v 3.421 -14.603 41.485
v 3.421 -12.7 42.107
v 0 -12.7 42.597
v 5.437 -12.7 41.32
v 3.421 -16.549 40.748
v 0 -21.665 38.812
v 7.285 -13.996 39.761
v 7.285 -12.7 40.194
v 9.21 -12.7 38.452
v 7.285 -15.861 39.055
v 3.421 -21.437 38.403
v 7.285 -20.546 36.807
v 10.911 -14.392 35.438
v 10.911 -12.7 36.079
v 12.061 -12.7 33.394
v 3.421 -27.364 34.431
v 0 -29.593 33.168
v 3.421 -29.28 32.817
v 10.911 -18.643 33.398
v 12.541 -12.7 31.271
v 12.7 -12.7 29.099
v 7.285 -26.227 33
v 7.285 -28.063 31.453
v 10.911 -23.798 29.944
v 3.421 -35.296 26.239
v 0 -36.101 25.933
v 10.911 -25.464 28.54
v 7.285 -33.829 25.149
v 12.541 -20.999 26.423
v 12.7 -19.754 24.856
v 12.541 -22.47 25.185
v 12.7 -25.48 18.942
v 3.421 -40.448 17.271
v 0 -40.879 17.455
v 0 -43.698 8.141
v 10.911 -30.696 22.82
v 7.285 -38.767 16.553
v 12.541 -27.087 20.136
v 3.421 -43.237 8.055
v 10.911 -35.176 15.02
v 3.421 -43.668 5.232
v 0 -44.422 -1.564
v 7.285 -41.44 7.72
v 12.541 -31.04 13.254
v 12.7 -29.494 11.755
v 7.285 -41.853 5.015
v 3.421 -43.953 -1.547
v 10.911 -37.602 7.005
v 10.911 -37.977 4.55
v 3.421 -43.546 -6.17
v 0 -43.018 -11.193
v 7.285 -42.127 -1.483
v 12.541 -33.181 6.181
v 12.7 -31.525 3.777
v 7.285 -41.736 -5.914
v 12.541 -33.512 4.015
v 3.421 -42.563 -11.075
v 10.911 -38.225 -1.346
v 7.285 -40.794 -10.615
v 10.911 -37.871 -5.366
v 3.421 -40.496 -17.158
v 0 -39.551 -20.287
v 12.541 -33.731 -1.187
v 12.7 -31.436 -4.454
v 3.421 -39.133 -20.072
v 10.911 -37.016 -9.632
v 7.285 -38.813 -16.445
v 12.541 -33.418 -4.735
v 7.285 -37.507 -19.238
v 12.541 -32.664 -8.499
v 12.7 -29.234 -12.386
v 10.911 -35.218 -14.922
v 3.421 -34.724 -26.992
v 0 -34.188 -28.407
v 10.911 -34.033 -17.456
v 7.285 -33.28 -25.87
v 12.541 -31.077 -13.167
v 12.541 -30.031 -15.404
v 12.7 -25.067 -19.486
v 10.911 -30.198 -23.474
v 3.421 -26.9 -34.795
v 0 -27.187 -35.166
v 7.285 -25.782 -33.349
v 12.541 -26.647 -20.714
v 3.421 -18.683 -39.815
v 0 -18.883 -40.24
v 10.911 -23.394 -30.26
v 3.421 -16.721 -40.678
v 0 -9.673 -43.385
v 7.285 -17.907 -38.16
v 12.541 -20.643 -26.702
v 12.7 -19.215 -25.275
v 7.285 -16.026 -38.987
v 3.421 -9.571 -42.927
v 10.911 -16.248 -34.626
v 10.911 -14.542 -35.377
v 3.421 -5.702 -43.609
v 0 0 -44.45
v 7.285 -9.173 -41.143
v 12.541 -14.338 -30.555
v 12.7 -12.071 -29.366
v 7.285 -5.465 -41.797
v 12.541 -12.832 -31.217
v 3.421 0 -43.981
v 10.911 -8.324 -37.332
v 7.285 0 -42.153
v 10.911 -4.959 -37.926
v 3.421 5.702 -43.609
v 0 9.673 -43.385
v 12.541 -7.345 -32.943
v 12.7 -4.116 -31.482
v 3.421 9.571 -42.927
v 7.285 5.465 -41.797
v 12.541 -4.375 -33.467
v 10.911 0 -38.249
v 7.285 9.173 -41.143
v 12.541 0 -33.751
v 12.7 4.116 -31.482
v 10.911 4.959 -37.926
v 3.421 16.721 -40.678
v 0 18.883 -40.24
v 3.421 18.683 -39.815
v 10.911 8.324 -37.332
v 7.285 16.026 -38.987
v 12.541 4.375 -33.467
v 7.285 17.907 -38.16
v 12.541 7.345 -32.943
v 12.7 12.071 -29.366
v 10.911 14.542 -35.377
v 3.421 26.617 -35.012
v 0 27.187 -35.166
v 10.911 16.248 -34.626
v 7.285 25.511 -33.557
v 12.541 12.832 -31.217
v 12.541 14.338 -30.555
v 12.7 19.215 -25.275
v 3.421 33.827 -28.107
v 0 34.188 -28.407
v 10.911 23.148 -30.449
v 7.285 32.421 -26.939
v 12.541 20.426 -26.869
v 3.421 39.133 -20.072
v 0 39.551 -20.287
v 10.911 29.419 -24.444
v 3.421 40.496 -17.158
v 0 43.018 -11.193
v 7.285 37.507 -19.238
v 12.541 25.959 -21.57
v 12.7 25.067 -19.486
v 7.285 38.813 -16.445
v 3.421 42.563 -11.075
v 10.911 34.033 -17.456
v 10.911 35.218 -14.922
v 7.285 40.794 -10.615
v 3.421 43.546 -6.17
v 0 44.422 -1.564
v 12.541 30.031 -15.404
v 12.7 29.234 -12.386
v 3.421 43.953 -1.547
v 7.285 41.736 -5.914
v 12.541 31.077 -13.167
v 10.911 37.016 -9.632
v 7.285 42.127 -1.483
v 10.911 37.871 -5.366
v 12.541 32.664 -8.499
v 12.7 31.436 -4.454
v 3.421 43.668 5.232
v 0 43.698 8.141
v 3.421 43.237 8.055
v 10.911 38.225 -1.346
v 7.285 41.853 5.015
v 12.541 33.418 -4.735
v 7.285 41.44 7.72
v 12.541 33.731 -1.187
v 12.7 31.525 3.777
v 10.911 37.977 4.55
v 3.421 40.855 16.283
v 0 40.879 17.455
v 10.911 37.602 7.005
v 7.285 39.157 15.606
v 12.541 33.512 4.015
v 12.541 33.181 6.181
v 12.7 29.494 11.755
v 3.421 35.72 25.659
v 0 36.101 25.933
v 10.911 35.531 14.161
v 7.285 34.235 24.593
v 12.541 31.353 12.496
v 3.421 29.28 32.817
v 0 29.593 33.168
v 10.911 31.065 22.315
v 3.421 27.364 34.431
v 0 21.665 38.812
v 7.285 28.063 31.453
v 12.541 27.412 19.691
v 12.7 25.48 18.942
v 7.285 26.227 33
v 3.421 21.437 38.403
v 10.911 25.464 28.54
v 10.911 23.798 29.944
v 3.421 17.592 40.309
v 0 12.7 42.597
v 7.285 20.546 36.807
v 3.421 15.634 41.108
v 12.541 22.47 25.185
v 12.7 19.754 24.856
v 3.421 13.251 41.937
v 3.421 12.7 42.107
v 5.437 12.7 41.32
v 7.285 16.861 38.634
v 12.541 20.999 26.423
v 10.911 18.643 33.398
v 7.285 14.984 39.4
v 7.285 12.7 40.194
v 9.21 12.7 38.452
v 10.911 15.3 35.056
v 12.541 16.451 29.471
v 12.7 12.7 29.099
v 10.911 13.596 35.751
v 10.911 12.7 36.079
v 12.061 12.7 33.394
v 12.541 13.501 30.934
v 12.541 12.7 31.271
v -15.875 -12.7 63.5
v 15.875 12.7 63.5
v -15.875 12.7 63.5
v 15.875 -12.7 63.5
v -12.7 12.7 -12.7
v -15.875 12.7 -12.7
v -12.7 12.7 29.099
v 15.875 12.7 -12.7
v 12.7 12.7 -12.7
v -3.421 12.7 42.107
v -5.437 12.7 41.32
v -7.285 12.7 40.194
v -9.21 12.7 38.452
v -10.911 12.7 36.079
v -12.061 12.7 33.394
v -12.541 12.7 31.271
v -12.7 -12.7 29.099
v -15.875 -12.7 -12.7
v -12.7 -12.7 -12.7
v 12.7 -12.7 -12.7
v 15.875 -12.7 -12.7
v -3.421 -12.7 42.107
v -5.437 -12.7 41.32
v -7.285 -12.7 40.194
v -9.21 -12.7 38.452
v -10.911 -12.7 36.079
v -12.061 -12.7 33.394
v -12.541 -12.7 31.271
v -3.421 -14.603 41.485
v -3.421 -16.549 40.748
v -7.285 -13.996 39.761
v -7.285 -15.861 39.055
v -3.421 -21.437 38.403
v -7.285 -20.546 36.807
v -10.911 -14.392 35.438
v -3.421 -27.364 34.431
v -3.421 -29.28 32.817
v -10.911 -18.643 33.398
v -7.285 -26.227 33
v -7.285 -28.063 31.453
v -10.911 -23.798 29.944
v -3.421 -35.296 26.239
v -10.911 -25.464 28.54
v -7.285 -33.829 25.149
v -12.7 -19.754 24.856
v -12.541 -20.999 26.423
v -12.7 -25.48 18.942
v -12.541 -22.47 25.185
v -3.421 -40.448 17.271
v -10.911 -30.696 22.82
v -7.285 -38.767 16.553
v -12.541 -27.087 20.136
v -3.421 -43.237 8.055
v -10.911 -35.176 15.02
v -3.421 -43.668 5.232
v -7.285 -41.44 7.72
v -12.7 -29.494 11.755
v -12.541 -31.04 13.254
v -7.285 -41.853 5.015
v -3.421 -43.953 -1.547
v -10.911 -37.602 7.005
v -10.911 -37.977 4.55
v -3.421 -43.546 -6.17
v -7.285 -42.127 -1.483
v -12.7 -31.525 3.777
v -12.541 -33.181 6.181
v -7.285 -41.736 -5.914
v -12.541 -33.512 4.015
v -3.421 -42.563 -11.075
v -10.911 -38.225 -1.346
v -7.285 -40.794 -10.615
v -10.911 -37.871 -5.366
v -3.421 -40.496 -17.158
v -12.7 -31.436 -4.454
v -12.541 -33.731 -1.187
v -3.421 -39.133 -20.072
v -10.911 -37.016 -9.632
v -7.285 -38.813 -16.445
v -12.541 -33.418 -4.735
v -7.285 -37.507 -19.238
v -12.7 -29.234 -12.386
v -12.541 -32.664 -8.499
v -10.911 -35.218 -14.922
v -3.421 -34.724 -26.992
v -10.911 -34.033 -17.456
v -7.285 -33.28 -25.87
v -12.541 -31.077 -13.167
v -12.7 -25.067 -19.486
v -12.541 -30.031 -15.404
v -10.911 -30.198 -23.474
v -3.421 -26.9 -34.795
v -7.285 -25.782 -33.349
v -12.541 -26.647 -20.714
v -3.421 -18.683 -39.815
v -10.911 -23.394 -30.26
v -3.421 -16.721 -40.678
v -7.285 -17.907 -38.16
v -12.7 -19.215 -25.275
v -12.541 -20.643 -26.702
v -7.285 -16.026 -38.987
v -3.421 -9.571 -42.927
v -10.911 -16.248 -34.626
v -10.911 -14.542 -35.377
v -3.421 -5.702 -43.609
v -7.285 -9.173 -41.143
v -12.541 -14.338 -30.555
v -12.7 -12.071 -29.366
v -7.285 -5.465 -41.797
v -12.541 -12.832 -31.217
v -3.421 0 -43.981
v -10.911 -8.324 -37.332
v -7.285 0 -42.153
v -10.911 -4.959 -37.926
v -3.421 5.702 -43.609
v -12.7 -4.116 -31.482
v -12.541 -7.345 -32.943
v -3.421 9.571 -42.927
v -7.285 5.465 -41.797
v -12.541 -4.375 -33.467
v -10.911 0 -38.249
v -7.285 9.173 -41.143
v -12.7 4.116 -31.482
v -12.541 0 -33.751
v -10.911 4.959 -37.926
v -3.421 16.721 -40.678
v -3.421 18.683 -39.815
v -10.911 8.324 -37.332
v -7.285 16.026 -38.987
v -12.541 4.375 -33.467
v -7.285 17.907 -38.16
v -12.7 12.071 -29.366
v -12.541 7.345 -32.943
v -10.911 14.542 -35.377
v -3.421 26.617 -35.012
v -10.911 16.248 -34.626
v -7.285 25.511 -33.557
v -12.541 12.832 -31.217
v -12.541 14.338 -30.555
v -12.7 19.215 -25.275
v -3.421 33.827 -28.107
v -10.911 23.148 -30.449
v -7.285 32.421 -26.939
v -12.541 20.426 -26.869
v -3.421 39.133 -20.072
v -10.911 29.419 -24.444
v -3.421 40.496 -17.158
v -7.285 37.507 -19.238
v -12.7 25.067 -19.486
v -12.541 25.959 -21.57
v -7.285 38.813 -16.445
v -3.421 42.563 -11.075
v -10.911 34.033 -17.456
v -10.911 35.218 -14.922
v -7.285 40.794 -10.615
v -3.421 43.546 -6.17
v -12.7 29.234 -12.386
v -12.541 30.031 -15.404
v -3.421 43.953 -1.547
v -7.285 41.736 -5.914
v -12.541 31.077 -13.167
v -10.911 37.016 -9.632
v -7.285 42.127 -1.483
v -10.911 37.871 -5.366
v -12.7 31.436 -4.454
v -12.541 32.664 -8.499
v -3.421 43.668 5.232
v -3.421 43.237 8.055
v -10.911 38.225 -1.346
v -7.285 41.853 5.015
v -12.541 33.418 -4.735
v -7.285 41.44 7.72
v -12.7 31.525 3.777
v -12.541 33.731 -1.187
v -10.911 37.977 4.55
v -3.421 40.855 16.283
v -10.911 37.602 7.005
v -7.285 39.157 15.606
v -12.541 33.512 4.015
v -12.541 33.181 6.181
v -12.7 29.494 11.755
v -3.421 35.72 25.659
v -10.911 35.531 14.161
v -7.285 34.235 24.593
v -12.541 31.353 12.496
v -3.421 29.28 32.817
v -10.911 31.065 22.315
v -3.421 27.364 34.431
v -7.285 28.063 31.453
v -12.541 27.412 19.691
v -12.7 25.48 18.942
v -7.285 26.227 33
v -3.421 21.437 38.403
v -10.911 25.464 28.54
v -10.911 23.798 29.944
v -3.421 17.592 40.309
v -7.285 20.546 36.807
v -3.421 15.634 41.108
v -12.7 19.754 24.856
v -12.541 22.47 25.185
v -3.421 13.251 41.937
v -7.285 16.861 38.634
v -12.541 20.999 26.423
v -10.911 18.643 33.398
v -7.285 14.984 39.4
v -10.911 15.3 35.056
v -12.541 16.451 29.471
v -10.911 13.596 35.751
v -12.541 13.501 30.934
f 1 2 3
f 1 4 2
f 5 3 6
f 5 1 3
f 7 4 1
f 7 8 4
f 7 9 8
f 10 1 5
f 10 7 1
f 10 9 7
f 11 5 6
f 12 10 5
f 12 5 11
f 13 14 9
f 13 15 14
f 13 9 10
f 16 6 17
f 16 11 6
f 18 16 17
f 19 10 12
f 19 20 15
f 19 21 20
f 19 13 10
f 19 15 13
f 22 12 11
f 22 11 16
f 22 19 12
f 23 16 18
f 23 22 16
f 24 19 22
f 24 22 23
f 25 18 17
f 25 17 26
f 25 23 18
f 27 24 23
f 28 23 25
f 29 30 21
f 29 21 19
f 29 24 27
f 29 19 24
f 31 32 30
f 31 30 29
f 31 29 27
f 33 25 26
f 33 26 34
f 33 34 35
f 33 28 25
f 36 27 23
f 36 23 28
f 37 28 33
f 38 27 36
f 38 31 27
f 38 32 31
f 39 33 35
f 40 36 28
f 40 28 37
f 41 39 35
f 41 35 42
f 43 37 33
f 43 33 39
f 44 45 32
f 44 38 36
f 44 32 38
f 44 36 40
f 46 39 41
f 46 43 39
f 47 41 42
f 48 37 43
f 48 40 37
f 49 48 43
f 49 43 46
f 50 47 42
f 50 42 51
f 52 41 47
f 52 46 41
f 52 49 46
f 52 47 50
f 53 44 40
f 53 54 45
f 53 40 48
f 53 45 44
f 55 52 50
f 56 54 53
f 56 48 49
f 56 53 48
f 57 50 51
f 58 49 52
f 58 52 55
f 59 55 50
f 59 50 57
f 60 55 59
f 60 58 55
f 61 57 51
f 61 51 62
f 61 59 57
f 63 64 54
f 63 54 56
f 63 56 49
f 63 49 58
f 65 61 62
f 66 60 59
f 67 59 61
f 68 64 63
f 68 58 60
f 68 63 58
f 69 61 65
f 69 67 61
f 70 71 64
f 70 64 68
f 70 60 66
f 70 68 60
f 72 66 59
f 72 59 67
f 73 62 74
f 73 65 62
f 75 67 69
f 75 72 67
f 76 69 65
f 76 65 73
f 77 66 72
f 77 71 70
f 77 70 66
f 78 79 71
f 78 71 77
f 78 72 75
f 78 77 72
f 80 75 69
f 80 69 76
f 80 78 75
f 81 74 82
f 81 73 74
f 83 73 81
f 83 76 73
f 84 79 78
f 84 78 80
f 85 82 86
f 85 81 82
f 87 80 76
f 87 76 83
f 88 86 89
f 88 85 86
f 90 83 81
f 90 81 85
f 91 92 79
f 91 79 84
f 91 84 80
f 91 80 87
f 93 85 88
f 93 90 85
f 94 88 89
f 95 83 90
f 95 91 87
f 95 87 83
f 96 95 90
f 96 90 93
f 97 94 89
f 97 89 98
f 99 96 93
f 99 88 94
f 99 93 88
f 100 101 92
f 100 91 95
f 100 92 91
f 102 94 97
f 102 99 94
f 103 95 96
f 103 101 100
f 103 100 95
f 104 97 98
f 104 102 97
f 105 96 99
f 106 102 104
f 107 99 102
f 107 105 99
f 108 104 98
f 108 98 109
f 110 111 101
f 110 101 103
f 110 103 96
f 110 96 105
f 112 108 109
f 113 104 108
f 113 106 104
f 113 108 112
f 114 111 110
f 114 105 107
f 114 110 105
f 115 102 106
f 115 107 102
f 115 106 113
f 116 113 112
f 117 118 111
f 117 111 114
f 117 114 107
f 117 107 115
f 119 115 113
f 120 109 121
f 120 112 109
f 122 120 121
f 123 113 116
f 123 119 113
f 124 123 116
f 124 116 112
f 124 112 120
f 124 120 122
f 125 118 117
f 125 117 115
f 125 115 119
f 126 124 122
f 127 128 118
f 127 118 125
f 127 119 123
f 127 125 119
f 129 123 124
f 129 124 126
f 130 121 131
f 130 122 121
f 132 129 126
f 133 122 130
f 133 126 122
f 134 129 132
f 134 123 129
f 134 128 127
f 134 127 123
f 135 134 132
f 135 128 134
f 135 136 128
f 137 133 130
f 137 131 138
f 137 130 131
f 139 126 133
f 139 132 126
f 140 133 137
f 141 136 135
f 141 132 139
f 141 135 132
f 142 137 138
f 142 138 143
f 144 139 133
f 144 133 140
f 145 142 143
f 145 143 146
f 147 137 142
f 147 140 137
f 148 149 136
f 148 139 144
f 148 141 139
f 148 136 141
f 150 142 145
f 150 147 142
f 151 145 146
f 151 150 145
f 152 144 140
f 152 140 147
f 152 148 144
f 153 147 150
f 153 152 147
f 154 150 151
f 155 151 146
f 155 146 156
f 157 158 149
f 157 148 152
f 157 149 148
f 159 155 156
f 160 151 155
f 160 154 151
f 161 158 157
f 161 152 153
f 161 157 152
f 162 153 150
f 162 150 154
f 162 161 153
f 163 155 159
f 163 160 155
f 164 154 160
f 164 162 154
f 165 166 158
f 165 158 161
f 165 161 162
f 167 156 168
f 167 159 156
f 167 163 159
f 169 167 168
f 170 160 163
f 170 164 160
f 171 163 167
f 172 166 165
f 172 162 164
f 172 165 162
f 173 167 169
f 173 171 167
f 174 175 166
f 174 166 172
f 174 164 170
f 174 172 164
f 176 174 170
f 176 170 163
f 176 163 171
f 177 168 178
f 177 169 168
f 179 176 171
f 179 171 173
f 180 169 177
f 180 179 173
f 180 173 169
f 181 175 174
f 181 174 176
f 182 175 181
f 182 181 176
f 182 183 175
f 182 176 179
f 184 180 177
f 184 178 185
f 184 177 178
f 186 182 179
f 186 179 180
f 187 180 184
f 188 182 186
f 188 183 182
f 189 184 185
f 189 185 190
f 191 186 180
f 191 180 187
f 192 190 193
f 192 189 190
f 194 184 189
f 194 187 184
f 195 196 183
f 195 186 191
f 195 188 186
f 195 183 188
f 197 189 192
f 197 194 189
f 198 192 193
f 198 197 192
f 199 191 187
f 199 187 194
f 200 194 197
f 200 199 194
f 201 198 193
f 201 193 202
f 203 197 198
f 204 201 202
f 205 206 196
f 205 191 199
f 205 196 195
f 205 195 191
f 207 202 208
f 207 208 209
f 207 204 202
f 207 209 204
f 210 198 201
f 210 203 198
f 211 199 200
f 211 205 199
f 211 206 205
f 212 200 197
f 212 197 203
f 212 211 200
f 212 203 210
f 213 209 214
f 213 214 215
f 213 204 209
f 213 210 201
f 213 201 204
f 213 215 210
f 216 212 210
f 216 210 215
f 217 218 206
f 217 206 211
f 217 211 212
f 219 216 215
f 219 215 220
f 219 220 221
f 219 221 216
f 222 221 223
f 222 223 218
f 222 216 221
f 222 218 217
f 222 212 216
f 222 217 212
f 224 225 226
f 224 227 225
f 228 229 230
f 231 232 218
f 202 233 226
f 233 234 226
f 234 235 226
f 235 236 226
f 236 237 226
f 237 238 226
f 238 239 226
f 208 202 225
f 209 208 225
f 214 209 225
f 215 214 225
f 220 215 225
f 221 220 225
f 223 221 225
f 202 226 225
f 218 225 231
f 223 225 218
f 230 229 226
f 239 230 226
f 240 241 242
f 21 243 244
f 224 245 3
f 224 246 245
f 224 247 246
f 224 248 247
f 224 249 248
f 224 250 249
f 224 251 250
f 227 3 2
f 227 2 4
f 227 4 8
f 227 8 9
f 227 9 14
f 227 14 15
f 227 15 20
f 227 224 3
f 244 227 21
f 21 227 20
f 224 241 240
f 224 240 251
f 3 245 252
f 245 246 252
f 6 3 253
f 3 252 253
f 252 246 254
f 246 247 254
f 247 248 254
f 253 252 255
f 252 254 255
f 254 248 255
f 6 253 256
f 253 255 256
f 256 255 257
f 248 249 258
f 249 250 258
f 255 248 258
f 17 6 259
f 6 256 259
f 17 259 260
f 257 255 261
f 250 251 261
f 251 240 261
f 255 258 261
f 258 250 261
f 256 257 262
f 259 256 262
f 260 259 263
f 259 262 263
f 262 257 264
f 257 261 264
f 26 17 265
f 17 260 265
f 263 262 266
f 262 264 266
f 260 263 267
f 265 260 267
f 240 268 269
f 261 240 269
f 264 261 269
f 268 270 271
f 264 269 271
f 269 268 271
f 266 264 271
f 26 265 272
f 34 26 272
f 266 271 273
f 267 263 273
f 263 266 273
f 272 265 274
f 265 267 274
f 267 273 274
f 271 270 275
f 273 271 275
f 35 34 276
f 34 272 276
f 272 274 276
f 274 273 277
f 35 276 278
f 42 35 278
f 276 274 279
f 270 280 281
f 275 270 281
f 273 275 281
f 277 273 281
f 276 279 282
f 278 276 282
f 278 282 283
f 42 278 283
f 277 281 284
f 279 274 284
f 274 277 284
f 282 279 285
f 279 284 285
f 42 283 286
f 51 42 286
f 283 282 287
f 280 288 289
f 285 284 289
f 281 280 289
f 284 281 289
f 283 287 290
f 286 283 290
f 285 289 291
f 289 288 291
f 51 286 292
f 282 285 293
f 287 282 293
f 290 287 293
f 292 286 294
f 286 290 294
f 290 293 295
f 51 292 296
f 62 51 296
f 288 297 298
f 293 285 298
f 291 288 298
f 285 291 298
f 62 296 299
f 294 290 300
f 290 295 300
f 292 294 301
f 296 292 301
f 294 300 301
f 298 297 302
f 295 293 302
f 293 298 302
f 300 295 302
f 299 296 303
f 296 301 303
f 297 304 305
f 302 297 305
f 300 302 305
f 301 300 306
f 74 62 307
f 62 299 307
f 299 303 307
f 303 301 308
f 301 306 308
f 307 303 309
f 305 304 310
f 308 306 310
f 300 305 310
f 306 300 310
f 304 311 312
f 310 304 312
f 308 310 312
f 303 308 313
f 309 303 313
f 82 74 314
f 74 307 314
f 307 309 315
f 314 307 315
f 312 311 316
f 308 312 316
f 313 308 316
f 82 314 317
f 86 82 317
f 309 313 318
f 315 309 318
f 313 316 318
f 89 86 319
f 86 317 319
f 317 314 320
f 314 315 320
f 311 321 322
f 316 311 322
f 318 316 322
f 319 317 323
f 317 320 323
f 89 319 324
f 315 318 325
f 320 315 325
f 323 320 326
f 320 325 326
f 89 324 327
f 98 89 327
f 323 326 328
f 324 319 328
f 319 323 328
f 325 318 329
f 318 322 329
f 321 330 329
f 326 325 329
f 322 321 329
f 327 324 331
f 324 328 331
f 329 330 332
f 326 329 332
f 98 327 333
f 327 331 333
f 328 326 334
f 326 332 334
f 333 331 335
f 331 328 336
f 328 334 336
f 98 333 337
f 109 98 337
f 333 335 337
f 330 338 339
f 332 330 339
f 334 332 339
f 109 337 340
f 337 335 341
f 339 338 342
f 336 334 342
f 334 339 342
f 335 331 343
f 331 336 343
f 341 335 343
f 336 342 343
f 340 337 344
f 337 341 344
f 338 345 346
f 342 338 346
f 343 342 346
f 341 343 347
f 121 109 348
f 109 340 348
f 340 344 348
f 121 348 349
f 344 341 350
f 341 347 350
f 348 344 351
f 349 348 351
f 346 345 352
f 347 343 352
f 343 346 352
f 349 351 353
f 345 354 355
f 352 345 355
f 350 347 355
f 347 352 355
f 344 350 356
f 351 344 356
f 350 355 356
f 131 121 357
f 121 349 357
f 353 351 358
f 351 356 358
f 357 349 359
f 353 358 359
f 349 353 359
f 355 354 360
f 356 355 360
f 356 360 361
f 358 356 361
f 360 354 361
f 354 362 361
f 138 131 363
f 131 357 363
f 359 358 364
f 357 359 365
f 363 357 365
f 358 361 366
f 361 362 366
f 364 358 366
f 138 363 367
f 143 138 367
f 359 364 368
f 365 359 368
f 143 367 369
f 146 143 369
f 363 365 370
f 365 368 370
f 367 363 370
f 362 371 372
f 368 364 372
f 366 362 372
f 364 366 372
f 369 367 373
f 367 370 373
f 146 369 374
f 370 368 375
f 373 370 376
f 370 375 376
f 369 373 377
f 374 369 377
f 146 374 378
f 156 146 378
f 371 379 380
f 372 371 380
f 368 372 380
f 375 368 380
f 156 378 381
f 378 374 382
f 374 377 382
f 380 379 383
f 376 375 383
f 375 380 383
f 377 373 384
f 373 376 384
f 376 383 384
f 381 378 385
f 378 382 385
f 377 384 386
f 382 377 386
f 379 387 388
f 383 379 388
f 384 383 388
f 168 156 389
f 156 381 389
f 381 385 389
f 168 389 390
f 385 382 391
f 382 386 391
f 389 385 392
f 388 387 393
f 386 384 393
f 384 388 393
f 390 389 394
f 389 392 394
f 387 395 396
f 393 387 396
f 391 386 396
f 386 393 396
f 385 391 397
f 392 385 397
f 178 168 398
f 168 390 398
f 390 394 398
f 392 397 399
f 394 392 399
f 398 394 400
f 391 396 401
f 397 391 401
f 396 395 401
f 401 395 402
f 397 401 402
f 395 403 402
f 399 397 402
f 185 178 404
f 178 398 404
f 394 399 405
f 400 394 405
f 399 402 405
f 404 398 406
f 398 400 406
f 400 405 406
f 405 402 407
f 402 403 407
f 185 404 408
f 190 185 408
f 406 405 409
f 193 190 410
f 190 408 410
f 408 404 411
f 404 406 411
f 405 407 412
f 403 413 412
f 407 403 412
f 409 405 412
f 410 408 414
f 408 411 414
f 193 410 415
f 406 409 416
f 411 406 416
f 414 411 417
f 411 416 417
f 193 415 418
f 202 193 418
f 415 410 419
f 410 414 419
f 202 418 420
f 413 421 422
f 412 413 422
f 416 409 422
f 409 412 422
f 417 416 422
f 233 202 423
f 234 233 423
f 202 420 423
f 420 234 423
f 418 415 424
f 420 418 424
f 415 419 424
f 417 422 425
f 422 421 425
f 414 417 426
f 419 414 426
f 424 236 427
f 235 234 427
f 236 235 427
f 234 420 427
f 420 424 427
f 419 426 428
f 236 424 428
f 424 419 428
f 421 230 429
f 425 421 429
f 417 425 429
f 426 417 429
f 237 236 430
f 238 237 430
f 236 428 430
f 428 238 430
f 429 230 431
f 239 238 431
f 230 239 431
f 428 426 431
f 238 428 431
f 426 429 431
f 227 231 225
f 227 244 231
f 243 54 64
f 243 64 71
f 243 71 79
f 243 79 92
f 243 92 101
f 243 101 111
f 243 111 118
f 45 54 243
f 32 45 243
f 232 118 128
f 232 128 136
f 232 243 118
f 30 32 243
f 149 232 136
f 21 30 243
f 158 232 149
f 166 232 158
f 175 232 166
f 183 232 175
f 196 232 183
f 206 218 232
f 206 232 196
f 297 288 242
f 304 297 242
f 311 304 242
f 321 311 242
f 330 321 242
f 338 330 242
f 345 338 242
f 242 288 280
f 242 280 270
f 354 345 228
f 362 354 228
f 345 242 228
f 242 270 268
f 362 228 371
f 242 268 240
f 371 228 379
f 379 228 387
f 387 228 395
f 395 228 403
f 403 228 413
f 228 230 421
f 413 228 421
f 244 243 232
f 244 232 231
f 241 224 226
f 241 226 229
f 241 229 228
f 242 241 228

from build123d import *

# Parameters (mm, degrees)
F0_R     = 44.45
F0_R_2   = 6.35
F1_DEPTH = 12.7
F2_R     = 12.69999
F4_DEPTH = 12.7


# Not quite as in the source:
# - a fillet or chamfer is up to 0.001 mm smaller than in the source, because OpenCascade refuses the exact size


with BuildPart() as f1:
    # F0 (on Right) → F1 (new body, symmetric)
    with BuildSketch(Plane.YZ):
        Circle(F0_R)
        Circle(F0_R_2, mode=Mode.SUBTRACT)
    extrude(amount=F1_DEPTH, both=True)

    # F2 (radius 12.7 in the source; OpenCascade refuses exactly that, so slightly less here)
    f2_edges = [f1.edges().sort_by_distance(p)[0] for p in [
        (12.7, -44.45, 0),
        (-12.7, -44.45, 0),
    ]]
    fillet(f2_edges, radius=F2_R)

    # F3 (on Front) → F4 (join, symmetric)
    with BuildSketch(Plane.XZ):
        Polygon((15.875, 63.5), (-15.875, 63.5), (-15.875, 12.7), (-15.875, -12.7), (15.875, -12.7), (15.875, 12.7), align=None)
    extrude(amount=F4_DEPTH, both=True)


solid = f1.part
